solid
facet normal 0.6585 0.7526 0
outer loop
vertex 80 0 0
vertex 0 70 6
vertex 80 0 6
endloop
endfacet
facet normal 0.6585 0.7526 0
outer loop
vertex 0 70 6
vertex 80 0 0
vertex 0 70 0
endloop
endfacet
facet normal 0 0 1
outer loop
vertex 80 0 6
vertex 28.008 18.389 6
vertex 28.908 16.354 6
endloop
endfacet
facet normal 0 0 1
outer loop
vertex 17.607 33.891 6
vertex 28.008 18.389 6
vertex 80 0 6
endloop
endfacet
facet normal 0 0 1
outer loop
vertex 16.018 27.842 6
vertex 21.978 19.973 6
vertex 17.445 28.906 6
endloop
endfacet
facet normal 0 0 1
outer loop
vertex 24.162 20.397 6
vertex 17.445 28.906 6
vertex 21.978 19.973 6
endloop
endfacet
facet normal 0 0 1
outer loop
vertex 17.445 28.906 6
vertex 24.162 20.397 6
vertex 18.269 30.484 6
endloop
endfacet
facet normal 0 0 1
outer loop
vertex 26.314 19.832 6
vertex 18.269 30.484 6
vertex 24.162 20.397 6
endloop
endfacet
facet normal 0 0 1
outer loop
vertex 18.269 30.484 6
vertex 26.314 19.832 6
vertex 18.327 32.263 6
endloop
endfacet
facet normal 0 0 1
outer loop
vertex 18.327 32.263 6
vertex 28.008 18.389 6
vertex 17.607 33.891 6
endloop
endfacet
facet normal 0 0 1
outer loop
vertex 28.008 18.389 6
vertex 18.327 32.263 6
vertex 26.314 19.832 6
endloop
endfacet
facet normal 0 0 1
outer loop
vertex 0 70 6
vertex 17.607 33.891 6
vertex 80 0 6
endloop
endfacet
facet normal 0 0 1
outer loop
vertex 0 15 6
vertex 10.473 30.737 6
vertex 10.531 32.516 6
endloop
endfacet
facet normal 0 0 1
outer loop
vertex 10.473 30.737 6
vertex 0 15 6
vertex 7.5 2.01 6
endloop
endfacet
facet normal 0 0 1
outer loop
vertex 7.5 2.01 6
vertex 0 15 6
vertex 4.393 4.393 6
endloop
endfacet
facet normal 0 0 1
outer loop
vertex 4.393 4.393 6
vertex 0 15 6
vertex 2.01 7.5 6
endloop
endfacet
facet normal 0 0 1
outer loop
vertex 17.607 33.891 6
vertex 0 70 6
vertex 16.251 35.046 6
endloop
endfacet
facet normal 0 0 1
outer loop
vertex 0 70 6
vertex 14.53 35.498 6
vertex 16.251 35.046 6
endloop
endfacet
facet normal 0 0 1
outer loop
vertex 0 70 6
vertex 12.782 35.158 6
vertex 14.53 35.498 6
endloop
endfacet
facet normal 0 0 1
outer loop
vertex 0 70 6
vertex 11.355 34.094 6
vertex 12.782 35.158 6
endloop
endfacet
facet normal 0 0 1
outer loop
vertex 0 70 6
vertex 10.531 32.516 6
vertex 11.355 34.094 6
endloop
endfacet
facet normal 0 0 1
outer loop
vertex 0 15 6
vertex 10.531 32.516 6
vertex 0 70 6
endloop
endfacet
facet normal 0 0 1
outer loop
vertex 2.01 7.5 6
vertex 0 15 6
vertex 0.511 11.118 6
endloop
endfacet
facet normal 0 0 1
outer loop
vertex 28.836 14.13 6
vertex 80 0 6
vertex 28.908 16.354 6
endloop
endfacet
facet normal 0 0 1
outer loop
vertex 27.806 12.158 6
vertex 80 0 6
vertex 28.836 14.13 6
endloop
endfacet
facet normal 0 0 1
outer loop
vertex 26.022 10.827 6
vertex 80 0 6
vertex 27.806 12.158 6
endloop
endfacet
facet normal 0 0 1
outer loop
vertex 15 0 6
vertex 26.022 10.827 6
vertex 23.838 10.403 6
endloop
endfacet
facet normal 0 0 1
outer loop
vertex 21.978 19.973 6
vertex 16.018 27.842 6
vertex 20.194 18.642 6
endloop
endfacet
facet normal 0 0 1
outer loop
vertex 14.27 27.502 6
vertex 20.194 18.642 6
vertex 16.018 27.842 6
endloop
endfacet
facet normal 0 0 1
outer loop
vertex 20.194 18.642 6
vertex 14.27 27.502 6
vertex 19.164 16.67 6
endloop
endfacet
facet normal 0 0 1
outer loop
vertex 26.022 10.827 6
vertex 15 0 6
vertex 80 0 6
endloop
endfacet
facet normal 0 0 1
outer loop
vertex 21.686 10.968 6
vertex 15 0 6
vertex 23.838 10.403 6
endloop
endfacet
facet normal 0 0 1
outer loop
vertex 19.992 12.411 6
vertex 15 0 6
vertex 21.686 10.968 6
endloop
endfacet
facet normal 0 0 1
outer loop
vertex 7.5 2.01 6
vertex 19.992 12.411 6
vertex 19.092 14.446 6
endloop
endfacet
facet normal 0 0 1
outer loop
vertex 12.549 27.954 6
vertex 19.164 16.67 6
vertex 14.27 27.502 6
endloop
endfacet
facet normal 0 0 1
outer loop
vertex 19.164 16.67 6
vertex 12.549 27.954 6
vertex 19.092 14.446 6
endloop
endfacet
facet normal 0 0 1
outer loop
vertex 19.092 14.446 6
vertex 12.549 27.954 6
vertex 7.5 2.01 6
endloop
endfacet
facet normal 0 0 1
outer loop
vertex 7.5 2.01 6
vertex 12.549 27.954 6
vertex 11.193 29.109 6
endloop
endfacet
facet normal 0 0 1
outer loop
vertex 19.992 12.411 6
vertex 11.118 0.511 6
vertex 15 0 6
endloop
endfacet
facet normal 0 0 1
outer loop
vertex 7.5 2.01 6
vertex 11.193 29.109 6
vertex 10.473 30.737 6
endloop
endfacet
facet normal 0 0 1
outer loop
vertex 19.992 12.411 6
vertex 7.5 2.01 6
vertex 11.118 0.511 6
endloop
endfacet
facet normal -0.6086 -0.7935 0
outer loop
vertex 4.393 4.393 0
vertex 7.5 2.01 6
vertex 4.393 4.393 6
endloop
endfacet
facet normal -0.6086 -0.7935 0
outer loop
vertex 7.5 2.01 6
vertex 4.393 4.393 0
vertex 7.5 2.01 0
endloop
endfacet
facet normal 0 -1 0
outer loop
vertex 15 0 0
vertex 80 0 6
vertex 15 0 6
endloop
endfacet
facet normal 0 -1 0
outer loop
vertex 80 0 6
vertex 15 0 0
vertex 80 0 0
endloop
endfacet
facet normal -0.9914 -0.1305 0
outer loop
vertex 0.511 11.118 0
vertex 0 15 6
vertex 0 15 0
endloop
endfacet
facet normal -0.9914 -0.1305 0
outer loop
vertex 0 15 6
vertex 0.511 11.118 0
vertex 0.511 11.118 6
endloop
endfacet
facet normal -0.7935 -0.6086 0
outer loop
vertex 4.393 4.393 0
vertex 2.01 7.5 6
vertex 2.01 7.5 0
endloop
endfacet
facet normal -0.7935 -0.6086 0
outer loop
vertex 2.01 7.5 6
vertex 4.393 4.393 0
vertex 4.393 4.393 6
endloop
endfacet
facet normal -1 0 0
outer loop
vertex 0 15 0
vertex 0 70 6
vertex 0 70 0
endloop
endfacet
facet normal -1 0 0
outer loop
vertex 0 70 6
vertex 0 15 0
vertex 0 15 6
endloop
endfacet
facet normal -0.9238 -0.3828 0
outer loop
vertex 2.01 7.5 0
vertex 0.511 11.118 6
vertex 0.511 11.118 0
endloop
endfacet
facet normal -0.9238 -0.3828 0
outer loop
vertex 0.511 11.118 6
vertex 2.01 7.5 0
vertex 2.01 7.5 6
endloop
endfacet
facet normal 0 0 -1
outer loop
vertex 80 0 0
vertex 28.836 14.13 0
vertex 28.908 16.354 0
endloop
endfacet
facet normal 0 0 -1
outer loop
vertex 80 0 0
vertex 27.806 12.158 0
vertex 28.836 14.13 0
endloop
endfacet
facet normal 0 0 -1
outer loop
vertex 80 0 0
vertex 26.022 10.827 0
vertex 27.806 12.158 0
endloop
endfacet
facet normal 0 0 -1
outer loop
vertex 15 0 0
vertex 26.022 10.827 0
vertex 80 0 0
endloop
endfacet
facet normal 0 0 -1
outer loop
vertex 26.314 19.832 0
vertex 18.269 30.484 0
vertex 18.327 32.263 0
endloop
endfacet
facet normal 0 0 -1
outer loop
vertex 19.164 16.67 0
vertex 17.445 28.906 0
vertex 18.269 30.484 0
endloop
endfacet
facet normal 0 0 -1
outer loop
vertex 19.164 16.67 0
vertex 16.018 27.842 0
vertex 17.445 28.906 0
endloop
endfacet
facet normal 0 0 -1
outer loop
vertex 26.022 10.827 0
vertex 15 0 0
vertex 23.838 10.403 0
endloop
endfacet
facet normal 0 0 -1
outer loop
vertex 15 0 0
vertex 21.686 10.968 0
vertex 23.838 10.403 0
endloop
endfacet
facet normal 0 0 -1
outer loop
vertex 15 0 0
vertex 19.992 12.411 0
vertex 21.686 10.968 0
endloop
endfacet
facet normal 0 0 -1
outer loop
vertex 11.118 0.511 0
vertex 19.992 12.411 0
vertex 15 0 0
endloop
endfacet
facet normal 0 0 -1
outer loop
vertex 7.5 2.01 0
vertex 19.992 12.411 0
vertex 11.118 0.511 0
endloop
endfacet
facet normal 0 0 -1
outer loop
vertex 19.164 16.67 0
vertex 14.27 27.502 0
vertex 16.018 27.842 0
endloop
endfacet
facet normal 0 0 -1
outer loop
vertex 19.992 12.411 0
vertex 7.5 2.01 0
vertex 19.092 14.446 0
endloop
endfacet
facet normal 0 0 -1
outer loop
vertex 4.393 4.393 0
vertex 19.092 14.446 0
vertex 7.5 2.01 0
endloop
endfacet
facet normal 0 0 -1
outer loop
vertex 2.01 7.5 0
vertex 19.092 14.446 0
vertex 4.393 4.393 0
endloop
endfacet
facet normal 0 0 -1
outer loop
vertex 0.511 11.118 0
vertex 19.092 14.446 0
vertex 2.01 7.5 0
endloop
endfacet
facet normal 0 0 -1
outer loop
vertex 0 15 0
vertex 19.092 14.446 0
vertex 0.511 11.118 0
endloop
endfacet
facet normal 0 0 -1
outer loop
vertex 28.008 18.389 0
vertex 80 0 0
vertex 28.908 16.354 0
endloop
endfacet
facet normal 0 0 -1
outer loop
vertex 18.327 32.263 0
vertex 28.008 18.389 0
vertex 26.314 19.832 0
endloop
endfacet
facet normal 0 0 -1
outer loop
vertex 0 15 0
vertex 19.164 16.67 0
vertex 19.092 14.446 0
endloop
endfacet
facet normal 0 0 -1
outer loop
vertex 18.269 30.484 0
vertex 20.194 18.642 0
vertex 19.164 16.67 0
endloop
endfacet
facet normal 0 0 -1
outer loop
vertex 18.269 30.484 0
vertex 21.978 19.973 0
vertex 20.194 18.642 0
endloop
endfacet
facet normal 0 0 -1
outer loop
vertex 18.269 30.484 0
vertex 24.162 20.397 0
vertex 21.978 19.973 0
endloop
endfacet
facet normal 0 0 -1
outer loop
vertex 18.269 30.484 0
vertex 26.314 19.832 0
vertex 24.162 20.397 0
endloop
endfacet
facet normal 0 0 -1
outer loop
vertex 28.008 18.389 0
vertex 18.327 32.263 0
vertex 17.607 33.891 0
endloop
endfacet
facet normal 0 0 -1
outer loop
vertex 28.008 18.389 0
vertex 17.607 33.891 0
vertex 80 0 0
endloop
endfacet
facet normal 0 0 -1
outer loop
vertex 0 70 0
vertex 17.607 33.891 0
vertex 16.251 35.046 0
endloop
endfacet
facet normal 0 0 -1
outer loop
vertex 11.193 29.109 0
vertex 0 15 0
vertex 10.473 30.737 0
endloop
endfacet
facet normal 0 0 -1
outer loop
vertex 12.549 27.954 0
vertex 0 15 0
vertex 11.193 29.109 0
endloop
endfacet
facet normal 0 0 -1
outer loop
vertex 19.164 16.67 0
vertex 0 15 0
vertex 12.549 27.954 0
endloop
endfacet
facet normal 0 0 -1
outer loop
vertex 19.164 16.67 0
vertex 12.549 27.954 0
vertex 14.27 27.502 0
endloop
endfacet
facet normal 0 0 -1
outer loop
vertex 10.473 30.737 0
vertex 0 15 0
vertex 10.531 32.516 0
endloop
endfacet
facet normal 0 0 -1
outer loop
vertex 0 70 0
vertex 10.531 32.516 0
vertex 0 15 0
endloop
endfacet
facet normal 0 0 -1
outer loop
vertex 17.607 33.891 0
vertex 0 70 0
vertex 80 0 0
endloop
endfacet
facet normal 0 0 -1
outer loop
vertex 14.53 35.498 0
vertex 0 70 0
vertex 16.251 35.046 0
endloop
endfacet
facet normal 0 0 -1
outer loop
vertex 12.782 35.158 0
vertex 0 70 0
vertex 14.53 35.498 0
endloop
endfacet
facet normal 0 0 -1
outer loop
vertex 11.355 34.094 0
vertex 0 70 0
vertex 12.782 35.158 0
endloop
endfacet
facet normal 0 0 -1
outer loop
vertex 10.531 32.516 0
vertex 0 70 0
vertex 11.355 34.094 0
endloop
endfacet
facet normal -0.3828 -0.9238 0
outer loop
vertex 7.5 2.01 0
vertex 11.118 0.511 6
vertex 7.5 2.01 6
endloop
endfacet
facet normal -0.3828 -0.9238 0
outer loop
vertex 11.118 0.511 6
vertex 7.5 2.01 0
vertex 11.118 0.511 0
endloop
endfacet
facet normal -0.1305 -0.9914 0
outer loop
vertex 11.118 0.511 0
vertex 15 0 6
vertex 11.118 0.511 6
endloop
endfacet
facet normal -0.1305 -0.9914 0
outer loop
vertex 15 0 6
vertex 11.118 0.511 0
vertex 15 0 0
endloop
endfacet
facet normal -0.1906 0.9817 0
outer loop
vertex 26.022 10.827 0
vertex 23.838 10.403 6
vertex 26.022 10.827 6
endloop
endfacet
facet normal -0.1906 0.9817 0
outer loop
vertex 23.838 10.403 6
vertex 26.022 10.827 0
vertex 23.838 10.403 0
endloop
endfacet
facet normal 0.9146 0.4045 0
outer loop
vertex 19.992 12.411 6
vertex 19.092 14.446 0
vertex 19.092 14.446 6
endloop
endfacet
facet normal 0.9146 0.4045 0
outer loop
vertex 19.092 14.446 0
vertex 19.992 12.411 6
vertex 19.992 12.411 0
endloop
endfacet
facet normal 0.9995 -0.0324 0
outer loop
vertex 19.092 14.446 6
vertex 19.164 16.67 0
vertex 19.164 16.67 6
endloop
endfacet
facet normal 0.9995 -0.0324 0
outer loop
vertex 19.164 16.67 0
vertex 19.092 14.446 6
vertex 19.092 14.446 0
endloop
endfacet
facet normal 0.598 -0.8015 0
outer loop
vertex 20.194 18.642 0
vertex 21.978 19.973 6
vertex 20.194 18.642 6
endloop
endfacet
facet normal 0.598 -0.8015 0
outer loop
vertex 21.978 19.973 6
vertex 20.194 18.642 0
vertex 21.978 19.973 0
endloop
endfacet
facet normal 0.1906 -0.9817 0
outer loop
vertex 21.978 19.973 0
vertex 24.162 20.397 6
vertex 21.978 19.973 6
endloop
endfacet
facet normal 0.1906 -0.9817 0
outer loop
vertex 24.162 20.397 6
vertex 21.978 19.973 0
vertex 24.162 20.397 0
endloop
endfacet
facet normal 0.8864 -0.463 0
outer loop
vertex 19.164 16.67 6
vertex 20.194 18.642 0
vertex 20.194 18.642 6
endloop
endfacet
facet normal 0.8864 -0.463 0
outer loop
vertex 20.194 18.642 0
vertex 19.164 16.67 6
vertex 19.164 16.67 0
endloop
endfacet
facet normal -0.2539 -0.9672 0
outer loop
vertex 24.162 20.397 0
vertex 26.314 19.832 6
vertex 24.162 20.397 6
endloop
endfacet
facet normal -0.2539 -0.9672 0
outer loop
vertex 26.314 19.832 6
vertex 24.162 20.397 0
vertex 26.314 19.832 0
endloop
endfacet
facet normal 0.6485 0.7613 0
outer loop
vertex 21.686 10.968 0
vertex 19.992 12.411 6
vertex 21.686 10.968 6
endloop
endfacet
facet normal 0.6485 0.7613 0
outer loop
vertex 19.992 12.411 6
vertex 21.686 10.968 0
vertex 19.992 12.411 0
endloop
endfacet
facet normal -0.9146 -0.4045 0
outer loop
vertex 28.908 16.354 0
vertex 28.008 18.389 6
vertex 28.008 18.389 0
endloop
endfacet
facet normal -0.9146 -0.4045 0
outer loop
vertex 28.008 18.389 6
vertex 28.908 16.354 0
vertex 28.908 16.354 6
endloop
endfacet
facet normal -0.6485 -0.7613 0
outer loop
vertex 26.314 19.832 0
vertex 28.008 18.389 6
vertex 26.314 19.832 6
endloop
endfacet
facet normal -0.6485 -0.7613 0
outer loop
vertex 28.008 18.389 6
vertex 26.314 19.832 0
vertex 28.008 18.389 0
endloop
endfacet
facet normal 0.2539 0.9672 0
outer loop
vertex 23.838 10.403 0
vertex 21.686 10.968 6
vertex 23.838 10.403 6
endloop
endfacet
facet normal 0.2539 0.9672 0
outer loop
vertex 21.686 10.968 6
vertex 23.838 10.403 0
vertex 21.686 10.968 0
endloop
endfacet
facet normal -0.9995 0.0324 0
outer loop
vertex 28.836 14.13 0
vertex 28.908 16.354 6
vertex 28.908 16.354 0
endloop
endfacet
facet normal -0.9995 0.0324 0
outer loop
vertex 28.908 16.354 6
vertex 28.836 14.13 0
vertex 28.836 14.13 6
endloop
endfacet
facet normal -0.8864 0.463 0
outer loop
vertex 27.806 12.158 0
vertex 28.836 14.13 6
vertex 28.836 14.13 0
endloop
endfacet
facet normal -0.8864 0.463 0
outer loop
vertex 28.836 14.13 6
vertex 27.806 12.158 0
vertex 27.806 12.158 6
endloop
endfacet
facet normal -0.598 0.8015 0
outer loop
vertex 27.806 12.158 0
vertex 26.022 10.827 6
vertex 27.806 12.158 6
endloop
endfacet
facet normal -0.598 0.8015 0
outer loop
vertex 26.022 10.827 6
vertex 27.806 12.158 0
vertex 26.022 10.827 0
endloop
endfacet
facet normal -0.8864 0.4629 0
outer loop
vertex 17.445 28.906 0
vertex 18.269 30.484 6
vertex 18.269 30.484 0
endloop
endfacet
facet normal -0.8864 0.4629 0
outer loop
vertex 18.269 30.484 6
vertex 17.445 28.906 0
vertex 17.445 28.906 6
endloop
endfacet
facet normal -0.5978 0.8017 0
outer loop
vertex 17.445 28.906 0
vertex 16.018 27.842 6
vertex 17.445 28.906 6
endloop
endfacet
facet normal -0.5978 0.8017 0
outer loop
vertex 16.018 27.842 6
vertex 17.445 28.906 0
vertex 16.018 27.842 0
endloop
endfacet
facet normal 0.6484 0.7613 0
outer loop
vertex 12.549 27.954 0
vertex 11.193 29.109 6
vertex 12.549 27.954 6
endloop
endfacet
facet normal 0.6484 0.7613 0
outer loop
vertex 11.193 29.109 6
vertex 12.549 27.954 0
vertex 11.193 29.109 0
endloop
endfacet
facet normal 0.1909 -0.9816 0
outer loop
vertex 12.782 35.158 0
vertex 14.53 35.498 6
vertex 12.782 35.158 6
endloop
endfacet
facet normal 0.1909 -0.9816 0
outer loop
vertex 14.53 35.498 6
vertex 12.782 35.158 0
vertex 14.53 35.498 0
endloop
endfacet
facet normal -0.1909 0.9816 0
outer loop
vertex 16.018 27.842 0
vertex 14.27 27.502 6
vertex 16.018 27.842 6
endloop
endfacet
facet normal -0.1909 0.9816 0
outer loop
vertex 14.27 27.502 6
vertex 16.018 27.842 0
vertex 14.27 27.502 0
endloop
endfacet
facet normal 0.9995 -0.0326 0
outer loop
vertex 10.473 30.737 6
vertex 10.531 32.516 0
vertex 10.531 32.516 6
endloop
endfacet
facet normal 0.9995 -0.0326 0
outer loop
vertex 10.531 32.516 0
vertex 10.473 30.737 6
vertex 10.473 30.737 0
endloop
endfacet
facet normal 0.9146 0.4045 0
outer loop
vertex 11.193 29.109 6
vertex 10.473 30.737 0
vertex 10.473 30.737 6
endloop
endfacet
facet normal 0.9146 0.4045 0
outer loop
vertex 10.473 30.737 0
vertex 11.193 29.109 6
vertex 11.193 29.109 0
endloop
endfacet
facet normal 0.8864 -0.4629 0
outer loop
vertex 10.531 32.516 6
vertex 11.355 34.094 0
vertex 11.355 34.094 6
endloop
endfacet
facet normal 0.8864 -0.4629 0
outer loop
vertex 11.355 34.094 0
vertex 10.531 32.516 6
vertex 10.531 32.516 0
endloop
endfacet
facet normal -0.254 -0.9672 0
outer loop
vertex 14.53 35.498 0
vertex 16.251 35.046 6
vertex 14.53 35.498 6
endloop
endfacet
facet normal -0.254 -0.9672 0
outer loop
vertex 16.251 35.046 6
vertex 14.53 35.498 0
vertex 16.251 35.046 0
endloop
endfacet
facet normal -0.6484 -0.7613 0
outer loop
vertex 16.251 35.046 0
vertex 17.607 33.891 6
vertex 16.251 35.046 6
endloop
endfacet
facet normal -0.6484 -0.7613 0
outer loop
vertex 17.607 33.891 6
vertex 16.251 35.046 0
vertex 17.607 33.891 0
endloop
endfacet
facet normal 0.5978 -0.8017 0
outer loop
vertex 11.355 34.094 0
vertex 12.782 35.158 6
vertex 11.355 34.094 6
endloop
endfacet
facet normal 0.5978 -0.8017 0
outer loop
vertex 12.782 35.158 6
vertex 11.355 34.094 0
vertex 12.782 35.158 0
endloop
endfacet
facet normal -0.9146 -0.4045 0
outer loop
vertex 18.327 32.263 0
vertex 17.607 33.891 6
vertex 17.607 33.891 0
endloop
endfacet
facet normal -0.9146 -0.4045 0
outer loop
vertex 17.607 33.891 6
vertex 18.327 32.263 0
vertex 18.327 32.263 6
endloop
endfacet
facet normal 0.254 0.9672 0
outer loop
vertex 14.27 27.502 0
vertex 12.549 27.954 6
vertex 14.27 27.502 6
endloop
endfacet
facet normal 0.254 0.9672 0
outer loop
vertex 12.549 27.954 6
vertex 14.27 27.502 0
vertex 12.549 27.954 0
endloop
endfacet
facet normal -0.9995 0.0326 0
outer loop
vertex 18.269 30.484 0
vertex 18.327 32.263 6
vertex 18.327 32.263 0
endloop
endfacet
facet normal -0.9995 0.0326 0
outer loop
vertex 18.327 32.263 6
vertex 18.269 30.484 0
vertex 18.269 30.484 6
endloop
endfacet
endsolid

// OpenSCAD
$fn = 32;

// ----------------------------------------------------------------------
// Bracket plate: corner pad 80 x 70, fillet R15
// ----------------------------------------------------------------------

// --- parameters (mm) ---
hole_r = 4;               // bolt hole radius
plate_t = 6;              // plate thickness, Z (extrusion height)
leg_a = 80;               // base leg
leg_b = 70;               // height leg
fillet_r = 15;            // right-angle fillet radius
fit_tol = 0.02;           // declared fit tolerance (prompt contract)
free_tol = 0.2;           // declared free tolerance (prompt contract)

hole_d1 = 2 * hole_r + 2;
hole_d2 = 2 * hole_r;

profile = [[15, 0], [80, 0], [0, 70], [0, 15], [0.511, 11.118], [2.01, 7.5], [4.393, 4.393], [7.5, 2.01], [11.118, 0.511]];  // primary outline, 9 points, counter clockwise
void_1 = [[28.908, 16.354], [28.008, 18.389], [26.314, 19.832], [24.162, 20.397], [21.978, 19.973], [20.194, 18.642], [19.164, 16.67], [19.092, 14.446], [19.992, 12.411], [21.686, 10.968], [23.838, 10.403], [26.022, 10.827], [27.806, 12.158], [28.836, 14.13]];  // mount hole 1, 14 points
void_2 = [[18.327, 32.263], [17.607, 33.891], [16.251, 35.046], [14.53, 35.498], [12.782, 35.158], [11.355, 34.094], [10.531, 32.516], [10.473, 30.737], [11.193, 29.109], [12.549, 27.954], [14.27, 27.502], [16.018, 27.842], [17.445, 28.906], [18.269, 30.484]];  // mount hole 2, 14 points

// --- the one profile operation ---
difference() {
  linear_extrude(height = plate_t) polygon(points = profile);
  translate([0, 0, -1])
    linear_extrude(height = plate_t + 2) polygon(points = void_1);
  translate([0, 0, -1])
    linear_extrude(height = plate_t + 2) polygon(points = void_2);
}
